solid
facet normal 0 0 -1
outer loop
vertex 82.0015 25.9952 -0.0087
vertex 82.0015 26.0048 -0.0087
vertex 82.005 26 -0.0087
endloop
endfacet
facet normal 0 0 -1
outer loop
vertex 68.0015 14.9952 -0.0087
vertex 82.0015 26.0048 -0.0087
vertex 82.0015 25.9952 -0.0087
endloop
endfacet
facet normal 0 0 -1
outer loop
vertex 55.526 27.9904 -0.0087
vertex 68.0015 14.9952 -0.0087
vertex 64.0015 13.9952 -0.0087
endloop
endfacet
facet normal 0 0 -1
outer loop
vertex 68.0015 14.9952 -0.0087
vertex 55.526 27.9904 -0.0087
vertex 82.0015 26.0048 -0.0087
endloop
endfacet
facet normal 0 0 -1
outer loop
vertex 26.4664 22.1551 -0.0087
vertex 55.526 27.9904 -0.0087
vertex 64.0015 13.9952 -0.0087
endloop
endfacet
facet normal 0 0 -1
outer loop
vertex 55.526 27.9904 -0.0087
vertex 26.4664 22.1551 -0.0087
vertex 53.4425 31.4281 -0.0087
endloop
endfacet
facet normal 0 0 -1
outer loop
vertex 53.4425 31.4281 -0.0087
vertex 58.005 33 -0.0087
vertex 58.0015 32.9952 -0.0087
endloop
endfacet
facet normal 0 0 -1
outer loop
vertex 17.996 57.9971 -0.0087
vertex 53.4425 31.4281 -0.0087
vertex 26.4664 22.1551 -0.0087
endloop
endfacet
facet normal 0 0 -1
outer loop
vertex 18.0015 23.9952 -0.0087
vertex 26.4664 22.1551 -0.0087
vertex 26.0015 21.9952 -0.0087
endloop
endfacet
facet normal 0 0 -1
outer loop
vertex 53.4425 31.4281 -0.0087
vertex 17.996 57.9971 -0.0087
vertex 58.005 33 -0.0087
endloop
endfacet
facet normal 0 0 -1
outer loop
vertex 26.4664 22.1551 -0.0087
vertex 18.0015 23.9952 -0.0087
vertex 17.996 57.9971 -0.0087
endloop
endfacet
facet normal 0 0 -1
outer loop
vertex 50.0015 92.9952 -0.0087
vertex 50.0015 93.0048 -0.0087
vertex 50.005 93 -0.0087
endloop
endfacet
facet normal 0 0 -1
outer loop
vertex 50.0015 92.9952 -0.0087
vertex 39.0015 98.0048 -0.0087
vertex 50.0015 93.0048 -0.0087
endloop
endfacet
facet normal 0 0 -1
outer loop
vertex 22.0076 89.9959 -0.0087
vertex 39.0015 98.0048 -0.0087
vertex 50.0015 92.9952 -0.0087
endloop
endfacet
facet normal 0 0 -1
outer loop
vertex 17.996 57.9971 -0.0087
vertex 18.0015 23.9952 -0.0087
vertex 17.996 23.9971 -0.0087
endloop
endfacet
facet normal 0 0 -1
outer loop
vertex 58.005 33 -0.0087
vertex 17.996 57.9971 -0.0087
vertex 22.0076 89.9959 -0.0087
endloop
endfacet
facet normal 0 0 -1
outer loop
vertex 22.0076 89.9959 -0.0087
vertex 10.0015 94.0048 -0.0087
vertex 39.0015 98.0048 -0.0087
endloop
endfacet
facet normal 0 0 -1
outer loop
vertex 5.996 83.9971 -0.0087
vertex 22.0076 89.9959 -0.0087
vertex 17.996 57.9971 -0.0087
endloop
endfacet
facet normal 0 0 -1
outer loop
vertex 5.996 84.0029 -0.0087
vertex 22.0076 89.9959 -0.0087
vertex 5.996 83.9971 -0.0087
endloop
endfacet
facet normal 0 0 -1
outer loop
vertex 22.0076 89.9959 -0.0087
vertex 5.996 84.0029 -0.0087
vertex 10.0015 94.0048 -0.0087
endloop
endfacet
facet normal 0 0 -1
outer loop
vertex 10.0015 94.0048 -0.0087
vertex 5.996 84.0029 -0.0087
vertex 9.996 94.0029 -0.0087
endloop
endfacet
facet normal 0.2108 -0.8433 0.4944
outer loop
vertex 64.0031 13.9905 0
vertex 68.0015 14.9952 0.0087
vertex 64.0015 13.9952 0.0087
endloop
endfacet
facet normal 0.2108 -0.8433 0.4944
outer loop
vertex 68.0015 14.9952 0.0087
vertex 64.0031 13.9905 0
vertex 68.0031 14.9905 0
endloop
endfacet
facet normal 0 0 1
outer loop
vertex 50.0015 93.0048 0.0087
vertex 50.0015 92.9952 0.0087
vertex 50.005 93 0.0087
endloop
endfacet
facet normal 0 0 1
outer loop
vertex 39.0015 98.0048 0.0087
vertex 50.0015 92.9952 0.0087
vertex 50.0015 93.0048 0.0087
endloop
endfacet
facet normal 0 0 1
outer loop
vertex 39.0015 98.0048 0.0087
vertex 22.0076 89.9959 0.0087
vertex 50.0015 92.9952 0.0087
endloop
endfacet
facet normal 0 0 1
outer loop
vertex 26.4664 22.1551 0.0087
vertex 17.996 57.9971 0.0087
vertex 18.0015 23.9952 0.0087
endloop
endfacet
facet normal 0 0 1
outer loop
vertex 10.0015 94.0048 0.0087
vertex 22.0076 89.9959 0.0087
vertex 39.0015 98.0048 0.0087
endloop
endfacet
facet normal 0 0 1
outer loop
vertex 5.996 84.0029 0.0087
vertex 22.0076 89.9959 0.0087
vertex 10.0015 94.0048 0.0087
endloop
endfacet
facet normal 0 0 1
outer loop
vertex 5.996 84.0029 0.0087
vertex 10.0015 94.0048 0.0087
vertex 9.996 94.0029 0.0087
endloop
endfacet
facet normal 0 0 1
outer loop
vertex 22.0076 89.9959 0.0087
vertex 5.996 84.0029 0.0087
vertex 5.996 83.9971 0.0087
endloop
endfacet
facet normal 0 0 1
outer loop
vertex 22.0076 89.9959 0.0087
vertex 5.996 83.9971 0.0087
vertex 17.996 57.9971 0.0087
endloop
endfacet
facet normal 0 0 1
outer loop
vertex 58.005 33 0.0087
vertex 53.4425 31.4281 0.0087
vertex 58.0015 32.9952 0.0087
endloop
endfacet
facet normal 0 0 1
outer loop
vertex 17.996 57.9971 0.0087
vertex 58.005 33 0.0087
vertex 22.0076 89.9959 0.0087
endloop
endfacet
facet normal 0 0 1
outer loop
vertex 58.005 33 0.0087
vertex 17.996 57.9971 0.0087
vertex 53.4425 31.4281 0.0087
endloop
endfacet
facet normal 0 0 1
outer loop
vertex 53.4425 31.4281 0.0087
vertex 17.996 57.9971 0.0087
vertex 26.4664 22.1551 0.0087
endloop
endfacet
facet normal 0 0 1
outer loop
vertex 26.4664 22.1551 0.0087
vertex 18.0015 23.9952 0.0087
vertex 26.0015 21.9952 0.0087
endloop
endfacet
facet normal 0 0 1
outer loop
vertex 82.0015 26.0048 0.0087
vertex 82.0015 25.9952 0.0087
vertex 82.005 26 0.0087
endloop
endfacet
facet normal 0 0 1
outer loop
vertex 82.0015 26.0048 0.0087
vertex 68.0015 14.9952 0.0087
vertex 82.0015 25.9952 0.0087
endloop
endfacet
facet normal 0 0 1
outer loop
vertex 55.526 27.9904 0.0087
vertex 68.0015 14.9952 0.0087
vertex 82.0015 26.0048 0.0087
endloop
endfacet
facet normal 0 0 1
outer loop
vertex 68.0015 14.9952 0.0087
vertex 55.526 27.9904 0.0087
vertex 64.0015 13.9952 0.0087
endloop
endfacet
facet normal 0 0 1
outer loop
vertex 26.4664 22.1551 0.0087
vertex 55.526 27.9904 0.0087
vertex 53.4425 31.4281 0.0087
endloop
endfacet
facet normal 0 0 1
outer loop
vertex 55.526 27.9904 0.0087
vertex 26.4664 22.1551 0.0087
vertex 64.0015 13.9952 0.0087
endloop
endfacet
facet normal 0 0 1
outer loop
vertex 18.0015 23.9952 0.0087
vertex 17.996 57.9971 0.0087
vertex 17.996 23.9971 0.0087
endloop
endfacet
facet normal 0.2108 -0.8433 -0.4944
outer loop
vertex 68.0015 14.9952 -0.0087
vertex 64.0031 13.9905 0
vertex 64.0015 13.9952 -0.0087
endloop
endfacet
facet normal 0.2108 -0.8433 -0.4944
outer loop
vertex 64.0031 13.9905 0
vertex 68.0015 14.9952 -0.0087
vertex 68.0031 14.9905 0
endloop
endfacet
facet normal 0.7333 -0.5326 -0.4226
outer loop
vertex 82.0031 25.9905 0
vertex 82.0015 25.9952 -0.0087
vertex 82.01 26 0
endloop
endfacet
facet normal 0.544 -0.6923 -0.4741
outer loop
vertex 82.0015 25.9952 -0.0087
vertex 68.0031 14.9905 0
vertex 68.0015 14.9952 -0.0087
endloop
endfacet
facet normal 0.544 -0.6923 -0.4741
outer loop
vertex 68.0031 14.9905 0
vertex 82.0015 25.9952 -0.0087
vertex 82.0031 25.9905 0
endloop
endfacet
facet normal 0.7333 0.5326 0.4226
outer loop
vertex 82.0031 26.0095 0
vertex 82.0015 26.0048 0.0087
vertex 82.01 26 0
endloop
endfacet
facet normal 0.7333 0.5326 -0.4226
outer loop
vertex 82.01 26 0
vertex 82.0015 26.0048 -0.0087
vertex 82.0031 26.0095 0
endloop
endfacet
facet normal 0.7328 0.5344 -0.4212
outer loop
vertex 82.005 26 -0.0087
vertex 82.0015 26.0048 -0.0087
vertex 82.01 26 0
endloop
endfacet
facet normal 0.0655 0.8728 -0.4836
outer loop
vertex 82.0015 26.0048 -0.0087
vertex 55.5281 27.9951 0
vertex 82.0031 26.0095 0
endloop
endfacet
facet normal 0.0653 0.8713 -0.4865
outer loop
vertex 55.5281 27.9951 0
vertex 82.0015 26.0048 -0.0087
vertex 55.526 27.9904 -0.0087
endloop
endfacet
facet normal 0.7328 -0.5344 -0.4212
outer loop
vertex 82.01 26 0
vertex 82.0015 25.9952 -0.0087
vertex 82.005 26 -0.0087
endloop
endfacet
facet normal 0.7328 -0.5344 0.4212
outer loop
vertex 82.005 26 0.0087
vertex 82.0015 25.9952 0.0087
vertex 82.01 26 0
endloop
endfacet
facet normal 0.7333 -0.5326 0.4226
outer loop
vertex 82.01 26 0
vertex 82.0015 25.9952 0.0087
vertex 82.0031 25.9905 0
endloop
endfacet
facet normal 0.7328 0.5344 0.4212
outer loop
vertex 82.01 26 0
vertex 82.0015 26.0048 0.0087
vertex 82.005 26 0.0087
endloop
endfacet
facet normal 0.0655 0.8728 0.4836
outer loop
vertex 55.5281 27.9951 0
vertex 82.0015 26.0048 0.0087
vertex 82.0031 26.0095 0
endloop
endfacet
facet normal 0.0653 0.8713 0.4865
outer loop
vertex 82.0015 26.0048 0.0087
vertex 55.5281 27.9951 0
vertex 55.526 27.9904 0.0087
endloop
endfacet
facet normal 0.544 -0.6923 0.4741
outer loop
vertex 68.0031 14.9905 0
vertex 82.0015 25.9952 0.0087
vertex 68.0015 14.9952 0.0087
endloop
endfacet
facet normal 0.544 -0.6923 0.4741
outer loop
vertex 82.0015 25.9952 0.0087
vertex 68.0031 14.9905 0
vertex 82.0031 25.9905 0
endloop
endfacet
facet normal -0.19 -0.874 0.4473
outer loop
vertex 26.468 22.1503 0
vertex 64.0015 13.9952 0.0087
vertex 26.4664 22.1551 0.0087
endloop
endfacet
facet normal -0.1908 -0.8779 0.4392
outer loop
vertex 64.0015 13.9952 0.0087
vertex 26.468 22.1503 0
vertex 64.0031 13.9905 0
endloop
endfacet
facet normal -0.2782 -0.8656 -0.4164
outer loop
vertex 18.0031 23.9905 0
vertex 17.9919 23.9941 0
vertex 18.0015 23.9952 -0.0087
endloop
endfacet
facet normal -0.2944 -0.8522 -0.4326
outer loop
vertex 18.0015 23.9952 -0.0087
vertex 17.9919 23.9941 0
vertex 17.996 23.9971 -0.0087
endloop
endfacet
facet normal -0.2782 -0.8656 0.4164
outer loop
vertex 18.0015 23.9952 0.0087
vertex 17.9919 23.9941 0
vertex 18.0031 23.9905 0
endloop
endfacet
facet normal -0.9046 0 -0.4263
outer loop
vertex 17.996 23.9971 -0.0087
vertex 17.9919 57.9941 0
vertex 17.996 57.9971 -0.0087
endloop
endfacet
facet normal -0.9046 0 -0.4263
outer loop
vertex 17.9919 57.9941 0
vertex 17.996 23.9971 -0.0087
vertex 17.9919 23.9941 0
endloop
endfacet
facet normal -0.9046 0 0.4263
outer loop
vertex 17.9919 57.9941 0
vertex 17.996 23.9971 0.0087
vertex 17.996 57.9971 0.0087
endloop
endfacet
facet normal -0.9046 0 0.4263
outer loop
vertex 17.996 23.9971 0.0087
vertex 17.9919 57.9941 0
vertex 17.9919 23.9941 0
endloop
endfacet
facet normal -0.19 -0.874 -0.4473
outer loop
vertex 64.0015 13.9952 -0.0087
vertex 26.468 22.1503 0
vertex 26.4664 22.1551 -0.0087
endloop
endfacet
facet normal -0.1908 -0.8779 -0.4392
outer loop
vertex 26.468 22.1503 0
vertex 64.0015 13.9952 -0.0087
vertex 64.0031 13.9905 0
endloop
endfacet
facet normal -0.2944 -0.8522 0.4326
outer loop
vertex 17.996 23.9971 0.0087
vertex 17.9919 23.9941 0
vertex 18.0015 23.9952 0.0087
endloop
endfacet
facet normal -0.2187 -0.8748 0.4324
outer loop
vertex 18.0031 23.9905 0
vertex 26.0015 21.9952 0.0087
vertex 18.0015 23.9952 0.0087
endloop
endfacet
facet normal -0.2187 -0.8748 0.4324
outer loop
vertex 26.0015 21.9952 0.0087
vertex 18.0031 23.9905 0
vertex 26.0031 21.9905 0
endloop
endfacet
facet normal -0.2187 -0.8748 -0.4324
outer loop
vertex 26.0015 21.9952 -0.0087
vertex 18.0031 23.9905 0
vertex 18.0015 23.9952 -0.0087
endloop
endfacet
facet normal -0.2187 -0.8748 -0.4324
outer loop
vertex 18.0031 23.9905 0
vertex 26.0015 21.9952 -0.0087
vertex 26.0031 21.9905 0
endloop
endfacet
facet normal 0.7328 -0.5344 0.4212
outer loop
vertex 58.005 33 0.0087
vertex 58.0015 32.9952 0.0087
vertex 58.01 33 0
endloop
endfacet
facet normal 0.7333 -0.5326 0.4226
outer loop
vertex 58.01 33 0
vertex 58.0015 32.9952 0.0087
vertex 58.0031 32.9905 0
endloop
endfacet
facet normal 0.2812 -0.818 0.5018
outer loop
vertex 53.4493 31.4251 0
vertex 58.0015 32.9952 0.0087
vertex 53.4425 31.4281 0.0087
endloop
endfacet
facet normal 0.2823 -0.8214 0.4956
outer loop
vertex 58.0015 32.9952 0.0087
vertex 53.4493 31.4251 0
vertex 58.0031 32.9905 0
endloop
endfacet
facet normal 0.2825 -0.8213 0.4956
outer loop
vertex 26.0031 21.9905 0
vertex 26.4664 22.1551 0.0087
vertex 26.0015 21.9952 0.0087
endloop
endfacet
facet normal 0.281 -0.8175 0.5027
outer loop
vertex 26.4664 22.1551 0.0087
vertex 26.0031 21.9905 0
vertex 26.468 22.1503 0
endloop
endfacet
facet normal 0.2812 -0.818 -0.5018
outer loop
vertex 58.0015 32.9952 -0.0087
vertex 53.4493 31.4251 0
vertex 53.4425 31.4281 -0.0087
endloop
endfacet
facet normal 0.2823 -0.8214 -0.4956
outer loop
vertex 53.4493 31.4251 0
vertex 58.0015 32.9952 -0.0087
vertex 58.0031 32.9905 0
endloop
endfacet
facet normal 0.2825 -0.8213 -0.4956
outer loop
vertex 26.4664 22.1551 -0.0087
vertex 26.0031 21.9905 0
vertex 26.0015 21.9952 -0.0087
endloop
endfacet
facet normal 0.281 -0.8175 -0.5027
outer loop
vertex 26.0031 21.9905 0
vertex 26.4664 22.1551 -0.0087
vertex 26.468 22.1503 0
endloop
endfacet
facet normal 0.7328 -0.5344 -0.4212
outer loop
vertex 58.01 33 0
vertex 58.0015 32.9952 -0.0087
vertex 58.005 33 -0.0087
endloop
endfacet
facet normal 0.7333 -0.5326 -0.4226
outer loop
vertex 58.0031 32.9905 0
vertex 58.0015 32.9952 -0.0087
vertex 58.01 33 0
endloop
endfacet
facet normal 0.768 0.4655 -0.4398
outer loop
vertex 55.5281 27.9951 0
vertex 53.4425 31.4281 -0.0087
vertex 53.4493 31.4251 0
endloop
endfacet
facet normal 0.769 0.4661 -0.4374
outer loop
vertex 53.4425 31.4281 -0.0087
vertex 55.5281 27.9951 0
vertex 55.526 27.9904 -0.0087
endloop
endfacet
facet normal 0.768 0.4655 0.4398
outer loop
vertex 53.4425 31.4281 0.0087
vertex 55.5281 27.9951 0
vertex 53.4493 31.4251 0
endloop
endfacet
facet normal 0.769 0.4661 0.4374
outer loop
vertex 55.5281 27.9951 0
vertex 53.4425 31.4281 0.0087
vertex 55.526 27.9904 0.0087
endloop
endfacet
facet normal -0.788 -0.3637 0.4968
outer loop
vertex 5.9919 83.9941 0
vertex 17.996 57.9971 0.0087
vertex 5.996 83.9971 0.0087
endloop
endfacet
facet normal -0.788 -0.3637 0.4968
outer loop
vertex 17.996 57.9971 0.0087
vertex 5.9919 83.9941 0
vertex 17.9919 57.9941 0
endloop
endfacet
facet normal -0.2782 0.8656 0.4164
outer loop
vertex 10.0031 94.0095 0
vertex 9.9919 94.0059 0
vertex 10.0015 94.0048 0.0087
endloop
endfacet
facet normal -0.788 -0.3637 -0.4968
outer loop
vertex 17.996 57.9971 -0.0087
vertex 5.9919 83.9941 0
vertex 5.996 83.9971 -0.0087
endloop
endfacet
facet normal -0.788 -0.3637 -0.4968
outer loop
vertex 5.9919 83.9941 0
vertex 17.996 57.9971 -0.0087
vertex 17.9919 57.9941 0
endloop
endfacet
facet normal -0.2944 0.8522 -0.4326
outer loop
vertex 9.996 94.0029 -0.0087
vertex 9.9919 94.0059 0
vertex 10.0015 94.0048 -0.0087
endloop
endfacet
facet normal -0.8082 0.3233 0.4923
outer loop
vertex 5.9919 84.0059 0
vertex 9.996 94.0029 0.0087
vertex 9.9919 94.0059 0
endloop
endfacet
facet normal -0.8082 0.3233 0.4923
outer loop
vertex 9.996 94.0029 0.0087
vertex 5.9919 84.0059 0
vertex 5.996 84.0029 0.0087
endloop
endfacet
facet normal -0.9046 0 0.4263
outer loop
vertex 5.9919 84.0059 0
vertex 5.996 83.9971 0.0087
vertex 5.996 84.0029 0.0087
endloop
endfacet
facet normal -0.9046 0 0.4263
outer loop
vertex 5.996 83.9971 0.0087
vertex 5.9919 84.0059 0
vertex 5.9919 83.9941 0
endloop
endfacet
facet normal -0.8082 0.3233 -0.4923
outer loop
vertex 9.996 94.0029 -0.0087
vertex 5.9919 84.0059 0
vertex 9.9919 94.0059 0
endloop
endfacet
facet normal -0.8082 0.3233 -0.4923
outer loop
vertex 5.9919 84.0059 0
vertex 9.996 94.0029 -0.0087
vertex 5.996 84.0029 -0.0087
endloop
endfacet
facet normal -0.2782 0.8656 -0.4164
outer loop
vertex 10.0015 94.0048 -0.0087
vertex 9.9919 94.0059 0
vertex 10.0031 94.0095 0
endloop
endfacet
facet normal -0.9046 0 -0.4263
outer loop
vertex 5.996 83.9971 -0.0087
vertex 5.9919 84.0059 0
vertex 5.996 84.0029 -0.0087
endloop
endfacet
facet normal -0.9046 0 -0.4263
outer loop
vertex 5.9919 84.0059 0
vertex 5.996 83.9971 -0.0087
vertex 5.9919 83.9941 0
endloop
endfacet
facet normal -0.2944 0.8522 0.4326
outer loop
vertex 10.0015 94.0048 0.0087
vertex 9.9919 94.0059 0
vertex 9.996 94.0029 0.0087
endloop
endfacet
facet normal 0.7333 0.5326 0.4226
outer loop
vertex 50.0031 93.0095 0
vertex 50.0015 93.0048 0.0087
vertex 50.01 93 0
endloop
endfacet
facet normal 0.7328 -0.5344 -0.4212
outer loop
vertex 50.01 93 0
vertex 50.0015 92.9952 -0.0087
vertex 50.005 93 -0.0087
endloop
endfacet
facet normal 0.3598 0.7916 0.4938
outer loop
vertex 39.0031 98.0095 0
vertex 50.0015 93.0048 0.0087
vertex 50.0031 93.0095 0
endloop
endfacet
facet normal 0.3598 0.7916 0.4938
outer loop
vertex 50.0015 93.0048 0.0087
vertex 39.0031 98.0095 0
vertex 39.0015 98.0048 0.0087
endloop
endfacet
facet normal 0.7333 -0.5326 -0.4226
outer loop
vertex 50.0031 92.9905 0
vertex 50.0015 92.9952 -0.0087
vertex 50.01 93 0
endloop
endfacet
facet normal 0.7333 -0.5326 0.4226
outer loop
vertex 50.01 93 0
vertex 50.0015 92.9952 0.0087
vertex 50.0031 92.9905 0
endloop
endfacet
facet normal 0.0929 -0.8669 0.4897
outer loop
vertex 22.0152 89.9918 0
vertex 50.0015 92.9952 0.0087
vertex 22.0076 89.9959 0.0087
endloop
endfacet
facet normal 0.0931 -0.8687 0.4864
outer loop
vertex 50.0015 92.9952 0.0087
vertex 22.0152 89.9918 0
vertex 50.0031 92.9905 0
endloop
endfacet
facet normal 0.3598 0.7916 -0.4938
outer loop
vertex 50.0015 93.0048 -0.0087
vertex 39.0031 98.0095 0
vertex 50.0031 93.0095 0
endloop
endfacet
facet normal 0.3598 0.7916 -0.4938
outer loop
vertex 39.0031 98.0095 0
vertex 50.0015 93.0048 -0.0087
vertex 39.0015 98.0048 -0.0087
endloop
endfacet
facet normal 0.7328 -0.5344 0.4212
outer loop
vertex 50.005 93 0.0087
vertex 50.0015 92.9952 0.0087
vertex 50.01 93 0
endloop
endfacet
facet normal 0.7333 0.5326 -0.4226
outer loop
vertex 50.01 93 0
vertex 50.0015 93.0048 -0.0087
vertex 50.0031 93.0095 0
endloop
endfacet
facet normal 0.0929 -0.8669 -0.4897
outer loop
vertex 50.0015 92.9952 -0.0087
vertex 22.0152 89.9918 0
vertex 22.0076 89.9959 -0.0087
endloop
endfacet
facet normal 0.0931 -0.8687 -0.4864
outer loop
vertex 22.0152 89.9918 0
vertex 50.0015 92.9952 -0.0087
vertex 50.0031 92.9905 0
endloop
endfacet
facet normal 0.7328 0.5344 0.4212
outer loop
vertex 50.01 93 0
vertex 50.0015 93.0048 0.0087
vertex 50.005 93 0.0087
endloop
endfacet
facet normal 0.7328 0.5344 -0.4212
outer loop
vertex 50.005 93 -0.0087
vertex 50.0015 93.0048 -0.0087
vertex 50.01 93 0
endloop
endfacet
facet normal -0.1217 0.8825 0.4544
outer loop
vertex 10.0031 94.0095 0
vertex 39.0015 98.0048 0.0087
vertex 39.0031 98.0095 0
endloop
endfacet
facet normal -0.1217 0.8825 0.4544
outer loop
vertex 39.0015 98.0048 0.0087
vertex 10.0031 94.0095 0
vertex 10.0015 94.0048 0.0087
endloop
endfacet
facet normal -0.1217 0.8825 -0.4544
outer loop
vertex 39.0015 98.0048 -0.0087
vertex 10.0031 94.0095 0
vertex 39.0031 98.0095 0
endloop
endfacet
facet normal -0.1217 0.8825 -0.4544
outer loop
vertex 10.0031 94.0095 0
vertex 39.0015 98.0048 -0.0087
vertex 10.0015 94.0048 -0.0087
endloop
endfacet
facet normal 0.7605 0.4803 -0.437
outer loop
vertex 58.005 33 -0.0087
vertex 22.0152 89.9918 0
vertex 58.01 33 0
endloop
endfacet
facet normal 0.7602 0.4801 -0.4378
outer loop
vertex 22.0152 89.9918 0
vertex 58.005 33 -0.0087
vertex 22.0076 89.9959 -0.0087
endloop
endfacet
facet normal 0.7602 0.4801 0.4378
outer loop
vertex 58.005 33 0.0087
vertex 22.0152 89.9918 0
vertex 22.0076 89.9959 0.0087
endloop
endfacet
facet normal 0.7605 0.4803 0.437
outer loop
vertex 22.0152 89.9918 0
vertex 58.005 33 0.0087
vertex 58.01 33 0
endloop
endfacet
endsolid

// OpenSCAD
color([0.3519350680925015,0.6477014615427978,0.14125726454845833]) hull(){
    translate([64,14]) sphere(0.01);
    translate([68,15]) sphere(0.01);
    translate([42,29]) sphere(0.01);
}
color([0.23013900541024712,0.8285218163248013,0.9603761550286747]) hull(){
    translate([68,15]) sphere(0.01);
    translate([82,26]) sphere(0.01);
    translate([42,29]) sphere(0.01);
}
color([0.6050710034948523,0.017553655236826726,0.43262871278032167]) hull(){
    translate([64,14]) sphere(0.01);
    translate([42,29]) sphere(0.01);
    translate([18,24]) sphere(0.01);
}
color([0.2571490251669072,0.4480229944680496,0.14517873337393172]) hull(){
    translate([42,29]) sphere(0.01);
    translate([18,24]) sphere(0.01);
    translate([26,22]) sphere(0.01);
}
color([0.8405131005933094,0.9776834869331054,0.10300019528175153]) hull(){
    translate([42,29]) sphere(0.01);
    translate([26,22]) sphere(0.01);
    translate([58,33]) sphere(0.01);
}
color([0.998153073210626,0.8535026464000083,0.6855970549077809]) hull(){
    translate([64,14]) sphere(0.01);
    translate([18,24]) sphere(0.01);
    translate([44,47]) sphere(0.01);
}
color([0.7995005100691247,0.34047238184459006,0.1286635278612125]) hull(){
    translate([18,24]) sphere(0.01);
    translate([44,55]) sphere(0.01);
    translate([44,47]) sphere(0.01);
}
color([0.6020598448119898,0.9167847797194366,0.02081986636819022]) hull(){
    translate([44,55]) sphere(0.01);
    translate([44,47]) sphere(0.01);
    translate([58,33]) sphere(0.01);
}
color([0.9135118305629362,0.3823609034395232,0.42581309278619206]) hull(){
    translate([58,33]) sphere(0.01);
    translate([42,29]) sphere(0.01);
    translate([44,47]) sphere(0.01);
}
color([0.08967296065919184,0.0016857337534631478,0.31287848776698257]) hull(){
    translate([18,58]) sphere(0.01);
    translate([44,55]) sphere(0.01);
    translate([18,24]) sphere(0.01);
}
color([0.09731792302828757,0.364404074066101,0.8754307508322564]) hull(){
    translate([6,84]) sphere(0.01);
    translate([18,58]) sphere(0.01);
    translate([10,94]) sphere(0.01);
}
color([0.6967090939923642,0.5776053806129825,0.18685318159950626]) hull(){
    translate([18,58]) sphere(0.01);
    translate([22,90]) sphere(0.01);
    translate([10,94]) sphere(0.01);
}
color([0.9585806736472646,0.593334846568766,0.09927504601217696]) hull(){
    translate([22,90]) sphere(0.01);
    translate([50,93]) sphere(0.01);
    translate([39,98]) sphere(0.01);
}
color([0.19313665173925,0.6863688301261038,0.2093263356404984]) hull(){
    translate([22,90]) sphere(0.01);
    translate([39,98]) sphere(0.01);
    translate([10,94]) sphere(0.01);
}
color([0.2694340379225941,0.24598969558588324,0.16092298384524362]) hull(){
    translate([18,58]) sphere(0.01);
    translate([22,90]) sphere(0.01);
    translate([44,55]) sphere(0.01);
}
color([0.5102606956149307,0.431705445139412,0.38909399282504675]) hull(){
    translate([44,55]) sphere(0.01);
    translate([58,33]) sphere(0.01);
    translate([22,90]) sphere(0.01);
}
